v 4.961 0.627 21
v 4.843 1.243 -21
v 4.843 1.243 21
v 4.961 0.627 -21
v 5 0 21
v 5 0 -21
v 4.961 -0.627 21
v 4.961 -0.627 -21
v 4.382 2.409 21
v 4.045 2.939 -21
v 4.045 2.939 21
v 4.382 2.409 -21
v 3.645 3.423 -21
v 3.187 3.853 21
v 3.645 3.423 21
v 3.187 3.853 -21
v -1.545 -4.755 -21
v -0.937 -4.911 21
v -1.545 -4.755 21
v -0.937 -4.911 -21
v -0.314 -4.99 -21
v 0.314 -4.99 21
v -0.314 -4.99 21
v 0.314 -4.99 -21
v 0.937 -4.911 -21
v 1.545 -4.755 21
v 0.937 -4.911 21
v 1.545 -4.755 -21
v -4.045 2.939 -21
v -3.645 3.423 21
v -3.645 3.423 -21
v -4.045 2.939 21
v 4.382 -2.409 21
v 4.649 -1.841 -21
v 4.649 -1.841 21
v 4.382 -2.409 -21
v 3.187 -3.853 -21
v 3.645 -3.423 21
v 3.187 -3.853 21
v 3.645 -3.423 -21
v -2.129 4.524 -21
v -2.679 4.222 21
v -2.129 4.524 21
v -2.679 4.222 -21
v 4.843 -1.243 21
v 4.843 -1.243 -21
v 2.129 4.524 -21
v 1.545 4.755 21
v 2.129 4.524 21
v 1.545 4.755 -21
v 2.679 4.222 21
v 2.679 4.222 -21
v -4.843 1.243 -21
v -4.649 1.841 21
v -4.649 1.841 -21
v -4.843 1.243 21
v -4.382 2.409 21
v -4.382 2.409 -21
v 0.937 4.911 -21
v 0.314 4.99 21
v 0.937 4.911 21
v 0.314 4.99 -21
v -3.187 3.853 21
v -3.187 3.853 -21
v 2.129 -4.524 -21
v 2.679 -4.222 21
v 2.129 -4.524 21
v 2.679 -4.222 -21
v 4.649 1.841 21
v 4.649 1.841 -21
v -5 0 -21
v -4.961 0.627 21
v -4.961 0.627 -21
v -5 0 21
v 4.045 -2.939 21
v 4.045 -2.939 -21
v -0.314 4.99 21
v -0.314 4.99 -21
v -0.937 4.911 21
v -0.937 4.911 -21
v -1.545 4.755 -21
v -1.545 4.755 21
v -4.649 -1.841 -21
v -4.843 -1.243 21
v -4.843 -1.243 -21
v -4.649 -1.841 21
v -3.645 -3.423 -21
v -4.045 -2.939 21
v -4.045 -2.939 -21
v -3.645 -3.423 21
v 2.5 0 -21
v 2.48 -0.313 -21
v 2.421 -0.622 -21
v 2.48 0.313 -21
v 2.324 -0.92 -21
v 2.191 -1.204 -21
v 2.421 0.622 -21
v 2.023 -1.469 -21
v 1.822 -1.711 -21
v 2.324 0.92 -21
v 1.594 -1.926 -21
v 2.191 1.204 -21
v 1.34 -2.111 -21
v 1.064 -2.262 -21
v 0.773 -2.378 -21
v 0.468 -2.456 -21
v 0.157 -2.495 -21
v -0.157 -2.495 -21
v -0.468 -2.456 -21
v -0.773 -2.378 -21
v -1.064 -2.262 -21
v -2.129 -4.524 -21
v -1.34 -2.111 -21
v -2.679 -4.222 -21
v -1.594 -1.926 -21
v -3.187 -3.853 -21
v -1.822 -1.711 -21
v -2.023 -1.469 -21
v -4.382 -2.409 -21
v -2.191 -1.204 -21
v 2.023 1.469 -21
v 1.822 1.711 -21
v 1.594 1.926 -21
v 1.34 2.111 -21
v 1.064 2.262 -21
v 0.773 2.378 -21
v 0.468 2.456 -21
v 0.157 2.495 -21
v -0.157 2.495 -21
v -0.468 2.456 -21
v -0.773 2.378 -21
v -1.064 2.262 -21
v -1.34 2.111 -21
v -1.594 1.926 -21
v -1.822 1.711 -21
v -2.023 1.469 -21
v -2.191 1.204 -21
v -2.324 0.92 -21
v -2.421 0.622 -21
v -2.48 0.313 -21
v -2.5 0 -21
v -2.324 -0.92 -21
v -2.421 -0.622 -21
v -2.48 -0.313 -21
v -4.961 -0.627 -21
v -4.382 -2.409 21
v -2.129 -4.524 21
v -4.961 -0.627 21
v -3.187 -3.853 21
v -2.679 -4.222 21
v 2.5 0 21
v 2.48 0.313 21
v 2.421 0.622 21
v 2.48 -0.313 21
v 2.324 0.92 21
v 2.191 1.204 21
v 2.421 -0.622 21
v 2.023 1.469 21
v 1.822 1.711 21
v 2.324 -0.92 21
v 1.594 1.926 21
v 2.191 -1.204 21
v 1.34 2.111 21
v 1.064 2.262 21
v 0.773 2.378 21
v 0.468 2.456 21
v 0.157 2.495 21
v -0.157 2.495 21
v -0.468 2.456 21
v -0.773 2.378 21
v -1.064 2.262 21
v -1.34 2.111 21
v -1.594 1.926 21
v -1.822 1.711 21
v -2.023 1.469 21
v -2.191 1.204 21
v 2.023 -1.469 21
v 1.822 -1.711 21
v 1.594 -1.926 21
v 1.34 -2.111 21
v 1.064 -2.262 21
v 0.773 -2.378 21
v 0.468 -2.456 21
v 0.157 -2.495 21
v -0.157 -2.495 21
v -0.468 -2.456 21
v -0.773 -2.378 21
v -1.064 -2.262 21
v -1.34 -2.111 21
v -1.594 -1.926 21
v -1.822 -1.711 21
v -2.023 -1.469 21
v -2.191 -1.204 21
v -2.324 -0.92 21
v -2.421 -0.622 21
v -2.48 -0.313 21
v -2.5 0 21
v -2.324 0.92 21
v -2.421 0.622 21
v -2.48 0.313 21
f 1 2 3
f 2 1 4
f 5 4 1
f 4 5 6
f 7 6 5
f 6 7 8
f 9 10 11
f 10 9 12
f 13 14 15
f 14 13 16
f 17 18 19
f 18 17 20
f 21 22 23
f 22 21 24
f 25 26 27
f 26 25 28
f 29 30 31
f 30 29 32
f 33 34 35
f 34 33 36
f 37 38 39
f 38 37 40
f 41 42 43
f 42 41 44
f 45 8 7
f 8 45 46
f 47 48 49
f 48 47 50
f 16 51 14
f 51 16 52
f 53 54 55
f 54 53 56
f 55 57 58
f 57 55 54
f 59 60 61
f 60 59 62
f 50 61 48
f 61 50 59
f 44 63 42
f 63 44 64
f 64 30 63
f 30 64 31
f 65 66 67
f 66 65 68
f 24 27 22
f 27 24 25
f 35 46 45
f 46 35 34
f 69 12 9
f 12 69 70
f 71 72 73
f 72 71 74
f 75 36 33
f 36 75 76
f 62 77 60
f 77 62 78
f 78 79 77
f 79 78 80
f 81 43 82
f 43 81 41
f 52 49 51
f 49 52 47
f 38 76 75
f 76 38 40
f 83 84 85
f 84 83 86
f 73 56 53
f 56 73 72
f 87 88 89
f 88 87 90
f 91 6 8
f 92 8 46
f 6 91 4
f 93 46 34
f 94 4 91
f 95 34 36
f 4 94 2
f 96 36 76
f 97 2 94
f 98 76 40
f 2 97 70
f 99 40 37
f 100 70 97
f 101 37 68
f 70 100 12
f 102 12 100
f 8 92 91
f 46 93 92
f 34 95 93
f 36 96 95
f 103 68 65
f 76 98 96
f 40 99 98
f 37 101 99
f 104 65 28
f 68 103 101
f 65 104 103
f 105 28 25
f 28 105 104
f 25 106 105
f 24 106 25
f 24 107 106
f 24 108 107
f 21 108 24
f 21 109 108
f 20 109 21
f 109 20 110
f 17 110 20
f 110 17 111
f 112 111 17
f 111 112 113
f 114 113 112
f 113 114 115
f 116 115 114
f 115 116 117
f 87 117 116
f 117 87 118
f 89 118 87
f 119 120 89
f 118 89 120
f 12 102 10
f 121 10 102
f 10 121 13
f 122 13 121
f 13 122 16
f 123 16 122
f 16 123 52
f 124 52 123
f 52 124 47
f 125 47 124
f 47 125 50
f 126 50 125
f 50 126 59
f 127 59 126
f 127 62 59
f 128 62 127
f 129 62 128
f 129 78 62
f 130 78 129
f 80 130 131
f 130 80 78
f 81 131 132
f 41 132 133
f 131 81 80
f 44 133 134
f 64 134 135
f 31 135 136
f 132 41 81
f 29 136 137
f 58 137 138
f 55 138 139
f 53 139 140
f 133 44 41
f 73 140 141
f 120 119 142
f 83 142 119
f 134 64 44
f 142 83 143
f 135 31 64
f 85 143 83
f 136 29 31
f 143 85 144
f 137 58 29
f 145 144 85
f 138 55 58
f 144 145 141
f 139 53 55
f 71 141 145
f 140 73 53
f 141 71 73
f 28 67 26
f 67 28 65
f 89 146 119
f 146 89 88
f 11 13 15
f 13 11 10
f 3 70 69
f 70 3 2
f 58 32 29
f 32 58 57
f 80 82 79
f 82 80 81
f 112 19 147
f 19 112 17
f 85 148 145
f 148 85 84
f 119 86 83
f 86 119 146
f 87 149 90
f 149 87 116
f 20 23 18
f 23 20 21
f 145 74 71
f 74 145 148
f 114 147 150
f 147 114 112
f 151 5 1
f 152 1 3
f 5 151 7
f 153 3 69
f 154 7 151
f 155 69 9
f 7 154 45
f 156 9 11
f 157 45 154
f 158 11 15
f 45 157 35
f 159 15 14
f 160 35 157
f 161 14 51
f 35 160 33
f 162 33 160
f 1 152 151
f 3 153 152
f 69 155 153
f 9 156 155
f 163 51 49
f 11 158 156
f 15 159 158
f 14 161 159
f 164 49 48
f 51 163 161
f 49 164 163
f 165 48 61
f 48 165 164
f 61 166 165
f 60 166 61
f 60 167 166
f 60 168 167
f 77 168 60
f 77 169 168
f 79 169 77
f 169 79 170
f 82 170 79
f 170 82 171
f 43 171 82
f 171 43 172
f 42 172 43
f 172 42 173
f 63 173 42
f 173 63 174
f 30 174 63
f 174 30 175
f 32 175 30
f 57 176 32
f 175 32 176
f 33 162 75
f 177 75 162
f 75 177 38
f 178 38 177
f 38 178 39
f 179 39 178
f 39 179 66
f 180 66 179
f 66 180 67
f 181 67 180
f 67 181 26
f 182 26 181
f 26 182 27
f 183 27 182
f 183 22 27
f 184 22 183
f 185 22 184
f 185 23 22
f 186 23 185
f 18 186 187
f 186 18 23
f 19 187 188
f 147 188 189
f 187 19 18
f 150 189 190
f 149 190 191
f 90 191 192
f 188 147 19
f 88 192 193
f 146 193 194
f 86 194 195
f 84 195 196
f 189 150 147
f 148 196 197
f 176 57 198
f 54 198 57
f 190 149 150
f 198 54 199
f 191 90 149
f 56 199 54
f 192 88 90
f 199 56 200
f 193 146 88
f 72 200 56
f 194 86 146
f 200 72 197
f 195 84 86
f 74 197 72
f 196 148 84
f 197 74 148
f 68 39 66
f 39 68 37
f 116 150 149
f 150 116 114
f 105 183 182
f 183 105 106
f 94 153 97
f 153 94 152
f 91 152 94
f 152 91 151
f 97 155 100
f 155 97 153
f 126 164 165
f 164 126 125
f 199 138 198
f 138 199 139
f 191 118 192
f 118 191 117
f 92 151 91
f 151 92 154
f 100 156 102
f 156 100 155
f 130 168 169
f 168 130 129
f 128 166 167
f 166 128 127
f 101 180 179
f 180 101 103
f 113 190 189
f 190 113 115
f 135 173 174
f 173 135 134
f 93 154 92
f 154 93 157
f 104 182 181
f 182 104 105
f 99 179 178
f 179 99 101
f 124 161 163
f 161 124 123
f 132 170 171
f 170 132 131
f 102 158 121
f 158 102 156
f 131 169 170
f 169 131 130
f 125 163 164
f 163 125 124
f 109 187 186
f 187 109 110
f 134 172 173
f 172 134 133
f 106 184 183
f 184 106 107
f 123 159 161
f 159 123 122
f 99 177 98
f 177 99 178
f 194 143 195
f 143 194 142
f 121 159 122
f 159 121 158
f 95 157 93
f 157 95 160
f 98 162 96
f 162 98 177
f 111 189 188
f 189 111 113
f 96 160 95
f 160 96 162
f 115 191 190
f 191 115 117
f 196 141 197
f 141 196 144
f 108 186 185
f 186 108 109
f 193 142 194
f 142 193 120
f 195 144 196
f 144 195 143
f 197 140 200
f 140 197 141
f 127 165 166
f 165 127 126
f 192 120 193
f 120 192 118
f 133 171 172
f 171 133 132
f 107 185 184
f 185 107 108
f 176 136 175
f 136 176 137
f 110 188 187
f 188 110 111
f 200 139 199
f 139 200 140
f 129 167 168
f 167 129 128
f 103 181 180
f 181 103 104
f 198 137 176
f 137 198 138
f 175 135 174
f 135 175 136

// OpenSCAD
$fn = 50;


difference() {
	union() {
		translate(v = [0, 0, -21.0000000000]) {
			cylinder(h = 42, r = 5.0000000000);
		}
	}
	union() {
		translate(v = [0, 0, -100.0000000000]) {
			cylinder(h = 200, r = 2.5000000000);
		}
	}
}
